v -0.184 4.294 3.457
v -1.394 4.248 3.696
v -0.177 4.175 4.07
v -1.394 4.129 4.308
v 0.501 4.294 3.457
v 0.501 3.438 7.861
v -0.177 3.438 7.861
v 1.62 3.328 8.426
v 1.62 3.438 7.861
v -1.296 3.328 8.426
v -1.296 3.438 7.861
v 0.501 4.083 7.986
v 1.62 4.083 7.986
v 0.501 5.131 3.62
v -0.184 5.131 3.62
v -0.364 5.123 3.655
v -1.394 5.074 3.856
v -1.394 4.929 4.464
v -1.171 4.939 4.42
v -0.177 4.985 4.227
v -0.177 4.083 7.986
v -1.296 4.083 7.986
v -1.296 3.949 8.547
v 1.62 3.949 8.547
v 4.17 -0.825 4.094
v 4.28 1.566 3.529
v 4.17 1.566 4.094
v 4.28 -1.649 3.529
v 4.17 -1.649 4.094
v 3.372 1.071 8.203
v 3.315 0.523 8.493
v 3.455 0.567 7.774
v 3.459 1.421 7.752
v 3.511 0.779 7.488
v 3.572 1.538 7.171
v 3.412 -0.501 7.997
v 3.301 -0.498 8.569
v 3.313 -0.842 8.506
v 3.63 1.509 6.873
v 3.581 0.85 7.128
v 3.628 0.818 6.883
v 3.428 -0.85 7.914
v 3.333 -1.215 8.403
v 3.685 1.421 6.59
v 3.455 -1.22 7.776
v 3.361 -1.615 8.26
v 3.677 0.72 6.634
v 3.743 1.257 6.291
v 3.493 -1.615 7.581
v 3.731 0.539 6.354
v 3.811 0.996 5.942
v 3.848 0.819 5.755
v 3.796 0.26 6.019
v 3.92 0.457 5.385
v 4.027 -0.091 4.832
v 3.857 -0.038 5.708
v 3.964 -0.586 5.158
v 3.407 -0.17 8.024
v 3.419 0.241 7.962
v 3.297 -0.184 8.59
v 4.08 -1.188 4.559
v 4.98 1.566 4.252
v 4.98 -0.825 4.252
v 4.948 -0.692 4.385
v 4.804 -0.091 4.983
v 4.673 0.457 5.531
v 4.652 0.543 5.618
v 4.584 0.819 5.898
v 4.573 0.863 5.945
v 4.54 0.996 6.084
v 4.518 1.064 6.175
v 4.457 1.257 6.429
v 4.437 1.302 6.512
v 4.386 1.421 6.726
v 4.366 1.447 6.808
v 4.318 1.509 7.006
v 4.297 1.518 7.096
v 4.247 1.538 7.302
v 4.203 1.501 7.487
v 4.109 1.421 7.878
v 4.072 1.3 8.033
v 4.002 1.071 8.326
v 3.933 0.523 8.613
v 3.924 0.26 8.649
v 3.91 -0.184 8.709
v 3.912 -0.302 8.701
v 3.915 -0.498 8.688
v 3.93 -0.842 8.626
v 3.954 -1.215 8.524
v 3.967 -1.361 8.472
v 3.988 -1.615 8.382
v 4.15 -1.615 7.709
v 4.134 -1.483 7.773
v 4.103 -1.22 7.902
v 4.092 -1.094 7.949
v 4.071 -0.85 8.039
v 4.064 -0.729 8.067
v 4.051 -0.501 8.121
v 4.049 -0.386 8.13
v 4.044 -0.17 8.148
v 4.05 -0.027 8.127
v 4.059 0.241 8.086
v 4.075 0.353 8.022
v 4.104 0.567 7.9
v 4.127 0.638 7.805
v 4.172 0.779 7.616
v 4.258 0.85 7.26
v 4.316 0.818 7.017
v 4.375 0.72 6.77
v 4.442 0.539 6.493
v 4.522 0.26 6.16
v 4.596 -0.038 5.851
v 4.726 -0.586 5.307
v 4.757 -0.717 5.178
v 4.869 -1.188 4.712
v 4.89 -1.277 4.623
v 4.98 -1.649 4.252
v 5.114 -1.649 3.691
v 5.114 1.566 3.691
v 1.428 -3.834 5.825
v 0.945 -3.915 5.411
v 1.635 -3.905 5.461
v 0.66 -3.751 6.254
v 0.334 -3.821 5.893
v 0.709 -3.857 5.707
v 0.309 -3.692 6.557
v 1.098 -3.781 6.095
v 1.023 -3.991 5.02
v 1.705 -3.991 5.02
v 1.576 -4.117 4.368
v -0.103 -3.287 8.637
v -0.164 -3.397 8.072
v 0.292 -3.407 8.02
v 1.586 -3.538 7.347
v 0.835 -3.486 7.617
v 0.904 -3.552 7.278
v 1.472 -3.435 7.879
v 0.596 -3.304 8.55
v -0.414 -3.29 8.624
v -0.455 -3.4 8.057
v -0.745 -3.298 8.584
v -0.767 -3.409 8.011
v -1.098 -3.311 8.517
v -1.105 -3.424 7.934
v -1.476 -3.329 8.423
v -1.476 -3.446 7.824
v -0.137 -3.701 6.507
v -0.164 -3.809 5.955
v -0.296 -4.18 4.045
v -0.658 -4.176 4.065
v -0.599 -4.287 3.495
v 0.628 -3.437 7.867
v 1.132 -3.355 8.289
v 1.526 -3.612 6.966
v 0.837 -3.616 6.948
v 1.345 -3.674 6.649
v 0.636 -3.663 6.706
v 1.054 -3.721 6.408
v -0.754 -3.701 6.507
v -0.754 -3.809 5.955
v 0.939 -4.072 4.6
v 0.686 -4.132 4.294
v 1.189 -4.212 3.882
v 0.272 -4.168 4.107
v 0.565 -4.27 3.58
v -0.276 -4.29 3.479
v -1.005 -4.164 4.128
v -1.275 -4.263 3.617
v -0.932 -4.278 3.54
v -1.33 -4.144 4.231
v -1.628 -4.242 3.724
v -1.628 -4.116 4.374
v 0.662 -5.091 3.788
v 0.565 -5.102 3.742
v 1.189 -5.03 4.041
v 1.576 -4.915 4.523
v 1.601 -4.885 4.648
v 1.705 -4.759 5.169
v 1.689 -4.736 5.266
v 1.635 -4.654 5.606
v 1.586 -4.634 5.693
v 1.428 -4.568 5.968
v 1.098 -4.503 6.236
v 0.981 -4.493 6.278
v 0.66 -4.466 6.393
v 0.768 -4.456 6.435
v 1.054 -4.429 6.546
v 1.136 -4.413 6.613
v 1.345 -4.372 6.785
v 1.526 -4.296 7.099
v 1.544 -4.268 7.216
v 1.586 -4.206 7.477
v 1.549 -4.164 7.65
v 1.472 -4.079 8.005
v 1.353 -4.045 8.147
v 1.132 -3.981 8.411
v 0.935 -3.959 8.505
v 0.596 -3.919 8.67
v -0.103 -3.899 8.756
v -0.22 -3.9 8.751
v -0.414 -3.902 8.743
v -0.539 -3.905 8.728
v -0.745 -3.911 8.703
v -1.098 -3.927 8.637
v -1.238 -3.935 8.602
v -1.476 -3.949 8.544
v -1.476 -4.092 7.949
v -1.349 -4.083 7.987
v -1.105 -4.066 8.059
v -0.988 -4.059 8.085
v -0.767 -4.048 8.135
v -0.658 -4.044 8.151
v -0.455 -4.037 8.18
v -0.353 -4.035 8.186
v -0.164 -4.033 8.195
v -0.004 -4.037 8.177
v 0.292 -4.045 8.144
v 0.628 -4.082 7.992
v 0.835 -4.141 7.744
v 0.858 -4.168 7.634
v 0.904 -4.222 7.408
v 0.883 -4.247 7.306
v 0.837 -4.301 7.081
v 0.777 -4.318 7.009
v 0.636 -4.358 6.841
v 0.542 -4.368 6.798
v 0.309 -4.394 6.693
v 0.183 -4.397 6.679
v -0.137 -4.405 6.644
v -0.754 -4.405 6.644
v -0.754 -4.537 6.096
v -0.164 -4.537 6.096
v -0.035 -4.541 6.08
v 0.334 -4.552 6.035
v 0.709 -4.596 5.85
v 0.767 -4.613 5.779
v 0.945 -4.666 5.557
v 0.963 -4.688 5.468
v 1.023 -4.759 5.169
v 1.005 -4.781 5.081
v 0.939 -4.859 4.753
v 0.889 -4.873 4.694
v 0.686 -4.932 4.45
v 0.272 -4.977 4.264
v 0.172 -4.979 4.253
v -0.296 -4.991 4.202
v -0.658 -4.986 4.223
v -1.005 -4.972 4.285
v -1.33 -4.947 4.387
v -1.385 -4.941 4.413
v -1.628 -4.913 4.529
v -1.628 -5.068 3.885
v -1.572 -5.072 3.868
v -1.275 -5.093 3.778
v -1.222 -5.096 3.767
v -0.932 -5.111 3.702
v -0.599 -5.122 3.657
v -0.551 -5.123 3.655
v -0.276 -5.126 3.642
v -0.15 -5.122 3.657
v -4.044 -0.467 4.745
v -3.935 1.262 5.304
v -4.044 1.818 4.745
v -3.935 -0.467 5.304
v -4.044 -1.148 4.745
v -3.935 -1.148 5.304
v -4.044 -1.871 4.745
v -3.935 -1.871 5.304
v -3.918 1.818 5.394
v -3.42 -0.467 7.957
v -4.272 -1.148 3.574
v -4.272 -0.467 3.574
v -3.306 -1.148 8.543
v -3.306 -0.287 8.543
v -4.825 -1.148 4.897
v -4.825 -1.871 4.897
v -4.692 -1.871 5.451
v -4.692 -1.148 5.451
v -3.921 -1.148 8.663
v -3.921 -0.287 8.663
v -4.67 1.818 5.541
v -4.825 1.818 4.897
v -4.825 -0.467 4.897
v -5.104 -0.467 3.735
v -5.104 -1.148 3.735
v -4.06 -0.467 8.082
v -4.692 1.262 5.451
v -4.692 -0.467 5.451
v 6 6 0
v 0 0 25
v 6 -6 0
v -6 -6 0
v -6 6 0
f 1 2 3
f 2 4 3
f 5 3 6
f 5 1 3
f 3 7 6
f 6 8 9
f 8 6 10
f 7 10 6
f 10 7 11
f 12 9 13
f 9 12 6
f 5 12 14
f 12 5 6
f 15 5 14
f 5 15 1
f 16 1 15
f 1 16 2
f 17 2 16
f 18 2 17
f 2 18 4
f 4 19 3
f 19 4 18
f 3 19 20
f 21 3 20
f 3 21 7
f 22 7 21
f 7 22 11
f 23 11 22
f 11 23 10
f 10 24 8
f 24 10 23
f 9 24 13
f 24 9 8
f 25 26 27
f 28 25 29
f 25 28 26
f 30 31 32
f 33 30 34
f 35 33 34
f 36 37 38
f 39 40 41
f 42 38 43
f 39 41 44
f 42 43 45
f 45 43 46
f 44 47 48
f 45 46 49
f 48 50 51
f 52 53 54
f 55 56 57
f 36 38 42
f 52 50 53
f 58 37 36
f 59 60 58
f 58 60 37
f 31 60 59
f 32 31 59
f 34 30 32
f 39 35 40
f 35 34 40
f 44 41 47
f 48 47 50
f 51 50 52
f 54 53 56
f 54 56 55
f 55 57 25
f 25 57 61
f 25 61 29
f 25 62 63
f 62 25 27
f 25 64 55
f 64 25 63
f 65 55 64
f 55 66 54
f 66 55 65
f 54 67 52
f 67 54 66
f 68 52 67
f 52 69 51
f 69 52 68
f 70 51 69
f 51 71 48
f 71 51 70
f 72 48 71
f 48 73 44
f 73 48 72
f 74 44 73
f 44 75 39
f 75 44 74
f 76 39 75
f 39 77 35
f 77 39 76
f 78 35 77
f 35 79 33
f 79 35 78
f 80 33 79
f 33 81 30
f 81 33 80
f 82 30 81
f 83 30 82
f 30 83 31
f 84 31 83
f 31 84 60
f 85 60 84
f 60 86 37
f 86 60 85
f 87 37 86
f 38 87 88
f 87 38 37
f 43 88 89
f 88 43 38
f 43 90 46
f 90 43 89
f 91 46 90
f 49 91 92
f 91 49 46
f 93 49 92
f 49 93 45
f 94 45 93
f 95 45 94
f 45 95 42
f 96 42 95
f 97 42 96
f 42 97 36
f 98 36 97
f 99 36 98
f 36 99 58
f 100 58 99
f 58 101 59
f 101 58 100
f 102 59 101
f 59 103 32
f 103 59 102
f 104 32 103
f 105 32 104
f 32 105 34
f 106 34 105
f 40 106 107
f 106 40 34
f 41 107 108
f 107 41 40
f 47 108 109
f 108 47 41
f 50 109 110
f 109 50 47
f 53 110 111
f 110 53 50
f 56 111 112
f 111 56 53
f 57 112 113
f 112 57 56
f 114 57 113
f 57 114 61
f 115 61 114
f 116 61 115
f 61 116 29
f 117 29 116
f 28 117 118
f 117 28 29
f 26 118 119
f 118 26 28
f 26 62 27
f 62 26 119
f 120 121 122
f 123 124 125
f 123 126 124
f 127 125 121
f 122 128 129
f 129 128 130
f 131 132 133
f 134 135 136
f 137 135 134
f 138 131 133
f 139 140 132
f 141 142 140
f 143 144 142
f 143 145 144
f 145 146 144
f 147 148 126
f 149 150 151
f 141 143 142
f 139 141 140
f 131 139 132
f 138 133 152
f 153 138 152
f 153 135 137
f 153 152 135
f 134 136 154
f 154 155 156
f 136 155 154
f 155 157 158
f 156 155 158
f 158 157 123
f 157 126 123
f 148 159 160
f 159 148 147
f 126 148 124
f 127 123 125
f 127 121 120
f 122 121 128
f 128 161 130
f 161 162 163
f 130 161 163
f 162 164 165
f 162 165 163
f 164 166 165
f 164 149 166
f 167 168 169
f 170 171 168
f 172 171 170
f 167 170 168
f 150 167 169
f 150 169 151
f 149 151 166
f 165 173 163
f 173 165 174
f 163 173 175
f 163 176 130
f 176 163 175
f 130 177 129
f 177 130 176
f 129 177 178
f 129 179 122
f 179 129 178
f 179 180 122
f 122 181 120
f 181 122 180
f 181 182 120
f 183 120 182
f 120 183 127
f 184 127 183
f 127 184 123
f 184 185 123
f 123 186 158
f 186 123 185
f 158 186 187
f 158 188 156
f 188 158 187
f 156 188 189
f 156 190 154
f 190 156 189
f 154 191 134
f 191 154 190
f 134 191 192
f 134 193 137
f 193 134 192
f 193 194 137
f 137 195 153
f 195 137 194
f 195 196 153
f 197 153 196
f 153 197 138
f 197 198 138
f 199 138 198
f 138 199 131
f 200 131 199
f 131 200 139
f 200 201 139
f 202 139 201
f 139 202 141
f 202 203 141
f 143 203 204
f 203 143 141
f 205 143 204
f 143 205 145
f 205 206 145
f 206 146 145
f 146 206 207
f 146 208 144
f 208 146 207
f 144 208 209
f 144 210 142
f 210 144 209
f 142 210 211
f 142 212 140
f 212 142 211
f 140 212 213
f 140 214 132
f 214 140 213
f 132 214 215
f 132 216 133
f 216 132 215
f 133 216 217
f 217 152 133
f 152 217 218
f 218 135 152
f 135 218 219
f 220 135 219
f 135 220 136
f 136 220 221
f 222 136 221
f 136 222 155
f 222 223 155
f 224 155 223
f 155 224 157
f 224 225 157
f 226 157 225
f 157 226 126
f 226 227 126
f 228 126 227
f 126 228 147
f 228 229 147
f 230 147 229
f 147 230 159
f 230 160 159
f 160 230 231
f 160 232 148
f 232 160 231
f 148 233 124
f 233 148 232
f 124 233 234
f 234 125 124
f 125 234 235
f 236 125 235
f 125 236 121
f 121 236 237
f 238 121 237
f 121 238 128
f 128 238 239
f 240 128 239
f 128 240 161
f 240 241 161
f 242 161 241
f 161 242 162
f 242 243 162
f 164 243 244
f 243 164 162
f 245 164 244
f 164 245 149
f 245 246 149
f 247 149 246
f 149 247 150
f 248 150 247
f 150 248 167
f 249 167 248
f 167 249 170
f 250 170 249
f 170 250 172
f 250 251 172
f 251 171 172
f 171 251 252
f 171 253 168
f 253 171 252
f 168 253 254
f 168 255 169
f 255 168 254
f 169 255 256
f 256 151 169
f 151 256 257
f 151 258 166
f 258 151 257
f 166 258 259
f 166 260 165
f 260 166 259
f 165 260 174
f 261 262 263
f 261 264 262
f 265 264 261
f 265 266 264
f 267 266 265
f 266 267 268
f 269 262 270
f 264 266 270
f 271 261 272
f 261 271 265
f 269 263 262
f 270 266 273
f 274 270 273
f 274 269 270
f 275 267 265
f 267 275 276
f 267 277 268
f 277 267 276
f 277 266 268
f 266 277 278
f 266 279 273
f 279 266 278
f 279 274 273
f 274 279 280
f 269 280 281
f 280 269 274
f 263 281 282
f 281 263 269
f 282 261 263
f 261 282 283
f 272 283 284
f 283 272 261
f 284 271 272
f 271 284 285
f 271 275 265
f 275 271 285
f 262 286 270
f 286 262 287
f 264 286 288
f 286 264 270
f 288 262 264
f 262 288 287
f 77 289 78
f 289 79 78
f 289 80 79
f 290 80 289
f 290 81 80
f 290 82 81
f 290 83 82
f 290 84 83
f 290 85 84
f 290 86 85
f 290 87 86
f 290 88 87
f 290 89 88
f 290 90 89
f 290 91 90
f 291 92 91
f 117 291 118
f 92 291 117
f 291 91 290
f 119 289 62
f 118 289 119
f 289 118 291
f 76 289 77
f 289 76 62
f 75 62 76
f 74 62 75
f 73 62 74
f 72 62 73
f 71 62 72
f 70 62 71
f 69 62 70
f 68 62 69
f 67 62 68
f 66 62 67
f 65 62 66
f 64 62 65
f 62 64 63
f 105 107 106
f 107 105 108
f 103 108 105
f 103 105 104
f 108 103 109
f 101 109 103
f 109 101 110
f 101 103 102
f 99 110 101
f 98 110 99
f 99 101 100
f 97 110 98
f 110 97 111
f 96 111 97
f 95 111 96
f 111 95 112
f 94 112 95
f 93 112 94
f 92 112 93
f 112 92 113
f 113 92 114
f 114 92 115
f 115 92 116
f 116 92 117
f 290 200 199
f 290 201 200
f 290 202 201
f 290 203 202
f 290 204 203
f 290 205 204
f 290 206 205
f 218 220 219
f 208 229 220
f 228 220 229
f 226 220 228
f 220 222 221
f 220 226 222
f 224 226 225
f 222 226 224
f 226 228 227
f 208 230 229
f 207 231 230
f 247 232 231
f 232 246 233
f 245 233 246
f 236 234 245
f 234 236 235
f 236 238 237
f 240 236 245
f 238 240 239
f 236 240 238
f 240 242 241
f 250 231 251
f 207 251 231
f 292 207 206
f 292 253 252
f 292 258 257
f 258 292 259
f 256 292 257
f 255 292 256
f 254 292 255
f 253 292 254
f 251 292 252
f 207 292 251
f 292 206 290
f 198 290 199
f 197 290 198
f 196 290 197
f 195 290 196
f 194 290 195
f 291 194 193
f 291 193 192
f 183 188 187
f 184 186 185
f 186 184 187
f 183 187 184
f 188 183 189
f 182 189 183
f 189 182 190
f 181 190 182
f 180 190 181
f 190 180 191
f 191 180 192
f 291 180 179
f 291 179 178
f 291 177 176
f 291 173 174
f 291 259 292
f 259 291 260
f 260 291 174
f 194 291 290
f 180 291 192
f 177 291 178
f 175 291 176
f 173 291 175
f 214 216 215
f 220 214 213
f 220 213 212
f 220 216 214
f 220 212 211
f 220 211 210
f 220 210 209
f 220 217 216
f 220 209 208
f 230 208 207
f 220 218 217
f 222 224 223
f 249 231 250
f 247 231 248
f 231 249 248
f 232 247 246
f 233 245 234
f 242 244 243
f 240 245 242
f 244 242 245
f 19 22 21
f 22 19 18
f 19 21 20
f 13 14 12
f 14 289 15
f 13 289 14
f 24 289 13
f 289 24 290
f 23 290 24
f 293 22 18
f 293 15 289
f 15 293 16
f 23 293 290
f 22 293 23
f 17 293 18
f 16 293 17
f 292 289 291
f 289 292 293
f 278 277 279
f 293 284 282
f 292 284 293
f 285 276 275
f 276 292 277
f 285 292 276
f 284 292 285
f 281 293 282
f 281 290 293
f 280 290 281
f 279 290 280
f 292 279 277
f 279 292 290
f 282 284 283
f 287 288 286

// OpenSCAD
font = "Font 1 fixed";

cube_size = 60;
letter_size = 5;
letter_height = 1;
width = 6;
indent = 3.8;

module letter(l) {
	// Use linear_extrude() to make the letters 3D objects as they
	// are only 2D shapes when only using text()
	linear_extrude(height = letter_height) {
		text(l, 
        size = letter_size, 
        font = font, 
        halign = "center", 
        valign = "center", 
        $fn = 4);
	}
}

difference(){
  polyhedron(
    points = [
      [width,width,0], //side
      [width,-width,0], //side
      [-width,-width,0], //side
      [-width,width,0], //side
      [0,0,25] //apex
    ],
    faces = [
      [0, 1, 4], //first four are triangle sides
      [1, 2, 4],
      [2, 3, 4],
      [3, 0, 4],
      [1, 0, 3], //square base
      [2, 1, 3]
    ]
  );
   // (x, y, z)
  union() {
    color("blue") translate([0,indent,width]) rotate([-79, 0, 0]) letter("1");
	color("red") translate([indent,0,width]) rotate([79,0,90])  letter("2");
	color("green") translate([0,-indent,width]) rotate([79, 0, 0]) letter("3");
	color("grey") translate([-indent,0,width]) rotate([79, 0, -90]) letter("4");
    }
}
